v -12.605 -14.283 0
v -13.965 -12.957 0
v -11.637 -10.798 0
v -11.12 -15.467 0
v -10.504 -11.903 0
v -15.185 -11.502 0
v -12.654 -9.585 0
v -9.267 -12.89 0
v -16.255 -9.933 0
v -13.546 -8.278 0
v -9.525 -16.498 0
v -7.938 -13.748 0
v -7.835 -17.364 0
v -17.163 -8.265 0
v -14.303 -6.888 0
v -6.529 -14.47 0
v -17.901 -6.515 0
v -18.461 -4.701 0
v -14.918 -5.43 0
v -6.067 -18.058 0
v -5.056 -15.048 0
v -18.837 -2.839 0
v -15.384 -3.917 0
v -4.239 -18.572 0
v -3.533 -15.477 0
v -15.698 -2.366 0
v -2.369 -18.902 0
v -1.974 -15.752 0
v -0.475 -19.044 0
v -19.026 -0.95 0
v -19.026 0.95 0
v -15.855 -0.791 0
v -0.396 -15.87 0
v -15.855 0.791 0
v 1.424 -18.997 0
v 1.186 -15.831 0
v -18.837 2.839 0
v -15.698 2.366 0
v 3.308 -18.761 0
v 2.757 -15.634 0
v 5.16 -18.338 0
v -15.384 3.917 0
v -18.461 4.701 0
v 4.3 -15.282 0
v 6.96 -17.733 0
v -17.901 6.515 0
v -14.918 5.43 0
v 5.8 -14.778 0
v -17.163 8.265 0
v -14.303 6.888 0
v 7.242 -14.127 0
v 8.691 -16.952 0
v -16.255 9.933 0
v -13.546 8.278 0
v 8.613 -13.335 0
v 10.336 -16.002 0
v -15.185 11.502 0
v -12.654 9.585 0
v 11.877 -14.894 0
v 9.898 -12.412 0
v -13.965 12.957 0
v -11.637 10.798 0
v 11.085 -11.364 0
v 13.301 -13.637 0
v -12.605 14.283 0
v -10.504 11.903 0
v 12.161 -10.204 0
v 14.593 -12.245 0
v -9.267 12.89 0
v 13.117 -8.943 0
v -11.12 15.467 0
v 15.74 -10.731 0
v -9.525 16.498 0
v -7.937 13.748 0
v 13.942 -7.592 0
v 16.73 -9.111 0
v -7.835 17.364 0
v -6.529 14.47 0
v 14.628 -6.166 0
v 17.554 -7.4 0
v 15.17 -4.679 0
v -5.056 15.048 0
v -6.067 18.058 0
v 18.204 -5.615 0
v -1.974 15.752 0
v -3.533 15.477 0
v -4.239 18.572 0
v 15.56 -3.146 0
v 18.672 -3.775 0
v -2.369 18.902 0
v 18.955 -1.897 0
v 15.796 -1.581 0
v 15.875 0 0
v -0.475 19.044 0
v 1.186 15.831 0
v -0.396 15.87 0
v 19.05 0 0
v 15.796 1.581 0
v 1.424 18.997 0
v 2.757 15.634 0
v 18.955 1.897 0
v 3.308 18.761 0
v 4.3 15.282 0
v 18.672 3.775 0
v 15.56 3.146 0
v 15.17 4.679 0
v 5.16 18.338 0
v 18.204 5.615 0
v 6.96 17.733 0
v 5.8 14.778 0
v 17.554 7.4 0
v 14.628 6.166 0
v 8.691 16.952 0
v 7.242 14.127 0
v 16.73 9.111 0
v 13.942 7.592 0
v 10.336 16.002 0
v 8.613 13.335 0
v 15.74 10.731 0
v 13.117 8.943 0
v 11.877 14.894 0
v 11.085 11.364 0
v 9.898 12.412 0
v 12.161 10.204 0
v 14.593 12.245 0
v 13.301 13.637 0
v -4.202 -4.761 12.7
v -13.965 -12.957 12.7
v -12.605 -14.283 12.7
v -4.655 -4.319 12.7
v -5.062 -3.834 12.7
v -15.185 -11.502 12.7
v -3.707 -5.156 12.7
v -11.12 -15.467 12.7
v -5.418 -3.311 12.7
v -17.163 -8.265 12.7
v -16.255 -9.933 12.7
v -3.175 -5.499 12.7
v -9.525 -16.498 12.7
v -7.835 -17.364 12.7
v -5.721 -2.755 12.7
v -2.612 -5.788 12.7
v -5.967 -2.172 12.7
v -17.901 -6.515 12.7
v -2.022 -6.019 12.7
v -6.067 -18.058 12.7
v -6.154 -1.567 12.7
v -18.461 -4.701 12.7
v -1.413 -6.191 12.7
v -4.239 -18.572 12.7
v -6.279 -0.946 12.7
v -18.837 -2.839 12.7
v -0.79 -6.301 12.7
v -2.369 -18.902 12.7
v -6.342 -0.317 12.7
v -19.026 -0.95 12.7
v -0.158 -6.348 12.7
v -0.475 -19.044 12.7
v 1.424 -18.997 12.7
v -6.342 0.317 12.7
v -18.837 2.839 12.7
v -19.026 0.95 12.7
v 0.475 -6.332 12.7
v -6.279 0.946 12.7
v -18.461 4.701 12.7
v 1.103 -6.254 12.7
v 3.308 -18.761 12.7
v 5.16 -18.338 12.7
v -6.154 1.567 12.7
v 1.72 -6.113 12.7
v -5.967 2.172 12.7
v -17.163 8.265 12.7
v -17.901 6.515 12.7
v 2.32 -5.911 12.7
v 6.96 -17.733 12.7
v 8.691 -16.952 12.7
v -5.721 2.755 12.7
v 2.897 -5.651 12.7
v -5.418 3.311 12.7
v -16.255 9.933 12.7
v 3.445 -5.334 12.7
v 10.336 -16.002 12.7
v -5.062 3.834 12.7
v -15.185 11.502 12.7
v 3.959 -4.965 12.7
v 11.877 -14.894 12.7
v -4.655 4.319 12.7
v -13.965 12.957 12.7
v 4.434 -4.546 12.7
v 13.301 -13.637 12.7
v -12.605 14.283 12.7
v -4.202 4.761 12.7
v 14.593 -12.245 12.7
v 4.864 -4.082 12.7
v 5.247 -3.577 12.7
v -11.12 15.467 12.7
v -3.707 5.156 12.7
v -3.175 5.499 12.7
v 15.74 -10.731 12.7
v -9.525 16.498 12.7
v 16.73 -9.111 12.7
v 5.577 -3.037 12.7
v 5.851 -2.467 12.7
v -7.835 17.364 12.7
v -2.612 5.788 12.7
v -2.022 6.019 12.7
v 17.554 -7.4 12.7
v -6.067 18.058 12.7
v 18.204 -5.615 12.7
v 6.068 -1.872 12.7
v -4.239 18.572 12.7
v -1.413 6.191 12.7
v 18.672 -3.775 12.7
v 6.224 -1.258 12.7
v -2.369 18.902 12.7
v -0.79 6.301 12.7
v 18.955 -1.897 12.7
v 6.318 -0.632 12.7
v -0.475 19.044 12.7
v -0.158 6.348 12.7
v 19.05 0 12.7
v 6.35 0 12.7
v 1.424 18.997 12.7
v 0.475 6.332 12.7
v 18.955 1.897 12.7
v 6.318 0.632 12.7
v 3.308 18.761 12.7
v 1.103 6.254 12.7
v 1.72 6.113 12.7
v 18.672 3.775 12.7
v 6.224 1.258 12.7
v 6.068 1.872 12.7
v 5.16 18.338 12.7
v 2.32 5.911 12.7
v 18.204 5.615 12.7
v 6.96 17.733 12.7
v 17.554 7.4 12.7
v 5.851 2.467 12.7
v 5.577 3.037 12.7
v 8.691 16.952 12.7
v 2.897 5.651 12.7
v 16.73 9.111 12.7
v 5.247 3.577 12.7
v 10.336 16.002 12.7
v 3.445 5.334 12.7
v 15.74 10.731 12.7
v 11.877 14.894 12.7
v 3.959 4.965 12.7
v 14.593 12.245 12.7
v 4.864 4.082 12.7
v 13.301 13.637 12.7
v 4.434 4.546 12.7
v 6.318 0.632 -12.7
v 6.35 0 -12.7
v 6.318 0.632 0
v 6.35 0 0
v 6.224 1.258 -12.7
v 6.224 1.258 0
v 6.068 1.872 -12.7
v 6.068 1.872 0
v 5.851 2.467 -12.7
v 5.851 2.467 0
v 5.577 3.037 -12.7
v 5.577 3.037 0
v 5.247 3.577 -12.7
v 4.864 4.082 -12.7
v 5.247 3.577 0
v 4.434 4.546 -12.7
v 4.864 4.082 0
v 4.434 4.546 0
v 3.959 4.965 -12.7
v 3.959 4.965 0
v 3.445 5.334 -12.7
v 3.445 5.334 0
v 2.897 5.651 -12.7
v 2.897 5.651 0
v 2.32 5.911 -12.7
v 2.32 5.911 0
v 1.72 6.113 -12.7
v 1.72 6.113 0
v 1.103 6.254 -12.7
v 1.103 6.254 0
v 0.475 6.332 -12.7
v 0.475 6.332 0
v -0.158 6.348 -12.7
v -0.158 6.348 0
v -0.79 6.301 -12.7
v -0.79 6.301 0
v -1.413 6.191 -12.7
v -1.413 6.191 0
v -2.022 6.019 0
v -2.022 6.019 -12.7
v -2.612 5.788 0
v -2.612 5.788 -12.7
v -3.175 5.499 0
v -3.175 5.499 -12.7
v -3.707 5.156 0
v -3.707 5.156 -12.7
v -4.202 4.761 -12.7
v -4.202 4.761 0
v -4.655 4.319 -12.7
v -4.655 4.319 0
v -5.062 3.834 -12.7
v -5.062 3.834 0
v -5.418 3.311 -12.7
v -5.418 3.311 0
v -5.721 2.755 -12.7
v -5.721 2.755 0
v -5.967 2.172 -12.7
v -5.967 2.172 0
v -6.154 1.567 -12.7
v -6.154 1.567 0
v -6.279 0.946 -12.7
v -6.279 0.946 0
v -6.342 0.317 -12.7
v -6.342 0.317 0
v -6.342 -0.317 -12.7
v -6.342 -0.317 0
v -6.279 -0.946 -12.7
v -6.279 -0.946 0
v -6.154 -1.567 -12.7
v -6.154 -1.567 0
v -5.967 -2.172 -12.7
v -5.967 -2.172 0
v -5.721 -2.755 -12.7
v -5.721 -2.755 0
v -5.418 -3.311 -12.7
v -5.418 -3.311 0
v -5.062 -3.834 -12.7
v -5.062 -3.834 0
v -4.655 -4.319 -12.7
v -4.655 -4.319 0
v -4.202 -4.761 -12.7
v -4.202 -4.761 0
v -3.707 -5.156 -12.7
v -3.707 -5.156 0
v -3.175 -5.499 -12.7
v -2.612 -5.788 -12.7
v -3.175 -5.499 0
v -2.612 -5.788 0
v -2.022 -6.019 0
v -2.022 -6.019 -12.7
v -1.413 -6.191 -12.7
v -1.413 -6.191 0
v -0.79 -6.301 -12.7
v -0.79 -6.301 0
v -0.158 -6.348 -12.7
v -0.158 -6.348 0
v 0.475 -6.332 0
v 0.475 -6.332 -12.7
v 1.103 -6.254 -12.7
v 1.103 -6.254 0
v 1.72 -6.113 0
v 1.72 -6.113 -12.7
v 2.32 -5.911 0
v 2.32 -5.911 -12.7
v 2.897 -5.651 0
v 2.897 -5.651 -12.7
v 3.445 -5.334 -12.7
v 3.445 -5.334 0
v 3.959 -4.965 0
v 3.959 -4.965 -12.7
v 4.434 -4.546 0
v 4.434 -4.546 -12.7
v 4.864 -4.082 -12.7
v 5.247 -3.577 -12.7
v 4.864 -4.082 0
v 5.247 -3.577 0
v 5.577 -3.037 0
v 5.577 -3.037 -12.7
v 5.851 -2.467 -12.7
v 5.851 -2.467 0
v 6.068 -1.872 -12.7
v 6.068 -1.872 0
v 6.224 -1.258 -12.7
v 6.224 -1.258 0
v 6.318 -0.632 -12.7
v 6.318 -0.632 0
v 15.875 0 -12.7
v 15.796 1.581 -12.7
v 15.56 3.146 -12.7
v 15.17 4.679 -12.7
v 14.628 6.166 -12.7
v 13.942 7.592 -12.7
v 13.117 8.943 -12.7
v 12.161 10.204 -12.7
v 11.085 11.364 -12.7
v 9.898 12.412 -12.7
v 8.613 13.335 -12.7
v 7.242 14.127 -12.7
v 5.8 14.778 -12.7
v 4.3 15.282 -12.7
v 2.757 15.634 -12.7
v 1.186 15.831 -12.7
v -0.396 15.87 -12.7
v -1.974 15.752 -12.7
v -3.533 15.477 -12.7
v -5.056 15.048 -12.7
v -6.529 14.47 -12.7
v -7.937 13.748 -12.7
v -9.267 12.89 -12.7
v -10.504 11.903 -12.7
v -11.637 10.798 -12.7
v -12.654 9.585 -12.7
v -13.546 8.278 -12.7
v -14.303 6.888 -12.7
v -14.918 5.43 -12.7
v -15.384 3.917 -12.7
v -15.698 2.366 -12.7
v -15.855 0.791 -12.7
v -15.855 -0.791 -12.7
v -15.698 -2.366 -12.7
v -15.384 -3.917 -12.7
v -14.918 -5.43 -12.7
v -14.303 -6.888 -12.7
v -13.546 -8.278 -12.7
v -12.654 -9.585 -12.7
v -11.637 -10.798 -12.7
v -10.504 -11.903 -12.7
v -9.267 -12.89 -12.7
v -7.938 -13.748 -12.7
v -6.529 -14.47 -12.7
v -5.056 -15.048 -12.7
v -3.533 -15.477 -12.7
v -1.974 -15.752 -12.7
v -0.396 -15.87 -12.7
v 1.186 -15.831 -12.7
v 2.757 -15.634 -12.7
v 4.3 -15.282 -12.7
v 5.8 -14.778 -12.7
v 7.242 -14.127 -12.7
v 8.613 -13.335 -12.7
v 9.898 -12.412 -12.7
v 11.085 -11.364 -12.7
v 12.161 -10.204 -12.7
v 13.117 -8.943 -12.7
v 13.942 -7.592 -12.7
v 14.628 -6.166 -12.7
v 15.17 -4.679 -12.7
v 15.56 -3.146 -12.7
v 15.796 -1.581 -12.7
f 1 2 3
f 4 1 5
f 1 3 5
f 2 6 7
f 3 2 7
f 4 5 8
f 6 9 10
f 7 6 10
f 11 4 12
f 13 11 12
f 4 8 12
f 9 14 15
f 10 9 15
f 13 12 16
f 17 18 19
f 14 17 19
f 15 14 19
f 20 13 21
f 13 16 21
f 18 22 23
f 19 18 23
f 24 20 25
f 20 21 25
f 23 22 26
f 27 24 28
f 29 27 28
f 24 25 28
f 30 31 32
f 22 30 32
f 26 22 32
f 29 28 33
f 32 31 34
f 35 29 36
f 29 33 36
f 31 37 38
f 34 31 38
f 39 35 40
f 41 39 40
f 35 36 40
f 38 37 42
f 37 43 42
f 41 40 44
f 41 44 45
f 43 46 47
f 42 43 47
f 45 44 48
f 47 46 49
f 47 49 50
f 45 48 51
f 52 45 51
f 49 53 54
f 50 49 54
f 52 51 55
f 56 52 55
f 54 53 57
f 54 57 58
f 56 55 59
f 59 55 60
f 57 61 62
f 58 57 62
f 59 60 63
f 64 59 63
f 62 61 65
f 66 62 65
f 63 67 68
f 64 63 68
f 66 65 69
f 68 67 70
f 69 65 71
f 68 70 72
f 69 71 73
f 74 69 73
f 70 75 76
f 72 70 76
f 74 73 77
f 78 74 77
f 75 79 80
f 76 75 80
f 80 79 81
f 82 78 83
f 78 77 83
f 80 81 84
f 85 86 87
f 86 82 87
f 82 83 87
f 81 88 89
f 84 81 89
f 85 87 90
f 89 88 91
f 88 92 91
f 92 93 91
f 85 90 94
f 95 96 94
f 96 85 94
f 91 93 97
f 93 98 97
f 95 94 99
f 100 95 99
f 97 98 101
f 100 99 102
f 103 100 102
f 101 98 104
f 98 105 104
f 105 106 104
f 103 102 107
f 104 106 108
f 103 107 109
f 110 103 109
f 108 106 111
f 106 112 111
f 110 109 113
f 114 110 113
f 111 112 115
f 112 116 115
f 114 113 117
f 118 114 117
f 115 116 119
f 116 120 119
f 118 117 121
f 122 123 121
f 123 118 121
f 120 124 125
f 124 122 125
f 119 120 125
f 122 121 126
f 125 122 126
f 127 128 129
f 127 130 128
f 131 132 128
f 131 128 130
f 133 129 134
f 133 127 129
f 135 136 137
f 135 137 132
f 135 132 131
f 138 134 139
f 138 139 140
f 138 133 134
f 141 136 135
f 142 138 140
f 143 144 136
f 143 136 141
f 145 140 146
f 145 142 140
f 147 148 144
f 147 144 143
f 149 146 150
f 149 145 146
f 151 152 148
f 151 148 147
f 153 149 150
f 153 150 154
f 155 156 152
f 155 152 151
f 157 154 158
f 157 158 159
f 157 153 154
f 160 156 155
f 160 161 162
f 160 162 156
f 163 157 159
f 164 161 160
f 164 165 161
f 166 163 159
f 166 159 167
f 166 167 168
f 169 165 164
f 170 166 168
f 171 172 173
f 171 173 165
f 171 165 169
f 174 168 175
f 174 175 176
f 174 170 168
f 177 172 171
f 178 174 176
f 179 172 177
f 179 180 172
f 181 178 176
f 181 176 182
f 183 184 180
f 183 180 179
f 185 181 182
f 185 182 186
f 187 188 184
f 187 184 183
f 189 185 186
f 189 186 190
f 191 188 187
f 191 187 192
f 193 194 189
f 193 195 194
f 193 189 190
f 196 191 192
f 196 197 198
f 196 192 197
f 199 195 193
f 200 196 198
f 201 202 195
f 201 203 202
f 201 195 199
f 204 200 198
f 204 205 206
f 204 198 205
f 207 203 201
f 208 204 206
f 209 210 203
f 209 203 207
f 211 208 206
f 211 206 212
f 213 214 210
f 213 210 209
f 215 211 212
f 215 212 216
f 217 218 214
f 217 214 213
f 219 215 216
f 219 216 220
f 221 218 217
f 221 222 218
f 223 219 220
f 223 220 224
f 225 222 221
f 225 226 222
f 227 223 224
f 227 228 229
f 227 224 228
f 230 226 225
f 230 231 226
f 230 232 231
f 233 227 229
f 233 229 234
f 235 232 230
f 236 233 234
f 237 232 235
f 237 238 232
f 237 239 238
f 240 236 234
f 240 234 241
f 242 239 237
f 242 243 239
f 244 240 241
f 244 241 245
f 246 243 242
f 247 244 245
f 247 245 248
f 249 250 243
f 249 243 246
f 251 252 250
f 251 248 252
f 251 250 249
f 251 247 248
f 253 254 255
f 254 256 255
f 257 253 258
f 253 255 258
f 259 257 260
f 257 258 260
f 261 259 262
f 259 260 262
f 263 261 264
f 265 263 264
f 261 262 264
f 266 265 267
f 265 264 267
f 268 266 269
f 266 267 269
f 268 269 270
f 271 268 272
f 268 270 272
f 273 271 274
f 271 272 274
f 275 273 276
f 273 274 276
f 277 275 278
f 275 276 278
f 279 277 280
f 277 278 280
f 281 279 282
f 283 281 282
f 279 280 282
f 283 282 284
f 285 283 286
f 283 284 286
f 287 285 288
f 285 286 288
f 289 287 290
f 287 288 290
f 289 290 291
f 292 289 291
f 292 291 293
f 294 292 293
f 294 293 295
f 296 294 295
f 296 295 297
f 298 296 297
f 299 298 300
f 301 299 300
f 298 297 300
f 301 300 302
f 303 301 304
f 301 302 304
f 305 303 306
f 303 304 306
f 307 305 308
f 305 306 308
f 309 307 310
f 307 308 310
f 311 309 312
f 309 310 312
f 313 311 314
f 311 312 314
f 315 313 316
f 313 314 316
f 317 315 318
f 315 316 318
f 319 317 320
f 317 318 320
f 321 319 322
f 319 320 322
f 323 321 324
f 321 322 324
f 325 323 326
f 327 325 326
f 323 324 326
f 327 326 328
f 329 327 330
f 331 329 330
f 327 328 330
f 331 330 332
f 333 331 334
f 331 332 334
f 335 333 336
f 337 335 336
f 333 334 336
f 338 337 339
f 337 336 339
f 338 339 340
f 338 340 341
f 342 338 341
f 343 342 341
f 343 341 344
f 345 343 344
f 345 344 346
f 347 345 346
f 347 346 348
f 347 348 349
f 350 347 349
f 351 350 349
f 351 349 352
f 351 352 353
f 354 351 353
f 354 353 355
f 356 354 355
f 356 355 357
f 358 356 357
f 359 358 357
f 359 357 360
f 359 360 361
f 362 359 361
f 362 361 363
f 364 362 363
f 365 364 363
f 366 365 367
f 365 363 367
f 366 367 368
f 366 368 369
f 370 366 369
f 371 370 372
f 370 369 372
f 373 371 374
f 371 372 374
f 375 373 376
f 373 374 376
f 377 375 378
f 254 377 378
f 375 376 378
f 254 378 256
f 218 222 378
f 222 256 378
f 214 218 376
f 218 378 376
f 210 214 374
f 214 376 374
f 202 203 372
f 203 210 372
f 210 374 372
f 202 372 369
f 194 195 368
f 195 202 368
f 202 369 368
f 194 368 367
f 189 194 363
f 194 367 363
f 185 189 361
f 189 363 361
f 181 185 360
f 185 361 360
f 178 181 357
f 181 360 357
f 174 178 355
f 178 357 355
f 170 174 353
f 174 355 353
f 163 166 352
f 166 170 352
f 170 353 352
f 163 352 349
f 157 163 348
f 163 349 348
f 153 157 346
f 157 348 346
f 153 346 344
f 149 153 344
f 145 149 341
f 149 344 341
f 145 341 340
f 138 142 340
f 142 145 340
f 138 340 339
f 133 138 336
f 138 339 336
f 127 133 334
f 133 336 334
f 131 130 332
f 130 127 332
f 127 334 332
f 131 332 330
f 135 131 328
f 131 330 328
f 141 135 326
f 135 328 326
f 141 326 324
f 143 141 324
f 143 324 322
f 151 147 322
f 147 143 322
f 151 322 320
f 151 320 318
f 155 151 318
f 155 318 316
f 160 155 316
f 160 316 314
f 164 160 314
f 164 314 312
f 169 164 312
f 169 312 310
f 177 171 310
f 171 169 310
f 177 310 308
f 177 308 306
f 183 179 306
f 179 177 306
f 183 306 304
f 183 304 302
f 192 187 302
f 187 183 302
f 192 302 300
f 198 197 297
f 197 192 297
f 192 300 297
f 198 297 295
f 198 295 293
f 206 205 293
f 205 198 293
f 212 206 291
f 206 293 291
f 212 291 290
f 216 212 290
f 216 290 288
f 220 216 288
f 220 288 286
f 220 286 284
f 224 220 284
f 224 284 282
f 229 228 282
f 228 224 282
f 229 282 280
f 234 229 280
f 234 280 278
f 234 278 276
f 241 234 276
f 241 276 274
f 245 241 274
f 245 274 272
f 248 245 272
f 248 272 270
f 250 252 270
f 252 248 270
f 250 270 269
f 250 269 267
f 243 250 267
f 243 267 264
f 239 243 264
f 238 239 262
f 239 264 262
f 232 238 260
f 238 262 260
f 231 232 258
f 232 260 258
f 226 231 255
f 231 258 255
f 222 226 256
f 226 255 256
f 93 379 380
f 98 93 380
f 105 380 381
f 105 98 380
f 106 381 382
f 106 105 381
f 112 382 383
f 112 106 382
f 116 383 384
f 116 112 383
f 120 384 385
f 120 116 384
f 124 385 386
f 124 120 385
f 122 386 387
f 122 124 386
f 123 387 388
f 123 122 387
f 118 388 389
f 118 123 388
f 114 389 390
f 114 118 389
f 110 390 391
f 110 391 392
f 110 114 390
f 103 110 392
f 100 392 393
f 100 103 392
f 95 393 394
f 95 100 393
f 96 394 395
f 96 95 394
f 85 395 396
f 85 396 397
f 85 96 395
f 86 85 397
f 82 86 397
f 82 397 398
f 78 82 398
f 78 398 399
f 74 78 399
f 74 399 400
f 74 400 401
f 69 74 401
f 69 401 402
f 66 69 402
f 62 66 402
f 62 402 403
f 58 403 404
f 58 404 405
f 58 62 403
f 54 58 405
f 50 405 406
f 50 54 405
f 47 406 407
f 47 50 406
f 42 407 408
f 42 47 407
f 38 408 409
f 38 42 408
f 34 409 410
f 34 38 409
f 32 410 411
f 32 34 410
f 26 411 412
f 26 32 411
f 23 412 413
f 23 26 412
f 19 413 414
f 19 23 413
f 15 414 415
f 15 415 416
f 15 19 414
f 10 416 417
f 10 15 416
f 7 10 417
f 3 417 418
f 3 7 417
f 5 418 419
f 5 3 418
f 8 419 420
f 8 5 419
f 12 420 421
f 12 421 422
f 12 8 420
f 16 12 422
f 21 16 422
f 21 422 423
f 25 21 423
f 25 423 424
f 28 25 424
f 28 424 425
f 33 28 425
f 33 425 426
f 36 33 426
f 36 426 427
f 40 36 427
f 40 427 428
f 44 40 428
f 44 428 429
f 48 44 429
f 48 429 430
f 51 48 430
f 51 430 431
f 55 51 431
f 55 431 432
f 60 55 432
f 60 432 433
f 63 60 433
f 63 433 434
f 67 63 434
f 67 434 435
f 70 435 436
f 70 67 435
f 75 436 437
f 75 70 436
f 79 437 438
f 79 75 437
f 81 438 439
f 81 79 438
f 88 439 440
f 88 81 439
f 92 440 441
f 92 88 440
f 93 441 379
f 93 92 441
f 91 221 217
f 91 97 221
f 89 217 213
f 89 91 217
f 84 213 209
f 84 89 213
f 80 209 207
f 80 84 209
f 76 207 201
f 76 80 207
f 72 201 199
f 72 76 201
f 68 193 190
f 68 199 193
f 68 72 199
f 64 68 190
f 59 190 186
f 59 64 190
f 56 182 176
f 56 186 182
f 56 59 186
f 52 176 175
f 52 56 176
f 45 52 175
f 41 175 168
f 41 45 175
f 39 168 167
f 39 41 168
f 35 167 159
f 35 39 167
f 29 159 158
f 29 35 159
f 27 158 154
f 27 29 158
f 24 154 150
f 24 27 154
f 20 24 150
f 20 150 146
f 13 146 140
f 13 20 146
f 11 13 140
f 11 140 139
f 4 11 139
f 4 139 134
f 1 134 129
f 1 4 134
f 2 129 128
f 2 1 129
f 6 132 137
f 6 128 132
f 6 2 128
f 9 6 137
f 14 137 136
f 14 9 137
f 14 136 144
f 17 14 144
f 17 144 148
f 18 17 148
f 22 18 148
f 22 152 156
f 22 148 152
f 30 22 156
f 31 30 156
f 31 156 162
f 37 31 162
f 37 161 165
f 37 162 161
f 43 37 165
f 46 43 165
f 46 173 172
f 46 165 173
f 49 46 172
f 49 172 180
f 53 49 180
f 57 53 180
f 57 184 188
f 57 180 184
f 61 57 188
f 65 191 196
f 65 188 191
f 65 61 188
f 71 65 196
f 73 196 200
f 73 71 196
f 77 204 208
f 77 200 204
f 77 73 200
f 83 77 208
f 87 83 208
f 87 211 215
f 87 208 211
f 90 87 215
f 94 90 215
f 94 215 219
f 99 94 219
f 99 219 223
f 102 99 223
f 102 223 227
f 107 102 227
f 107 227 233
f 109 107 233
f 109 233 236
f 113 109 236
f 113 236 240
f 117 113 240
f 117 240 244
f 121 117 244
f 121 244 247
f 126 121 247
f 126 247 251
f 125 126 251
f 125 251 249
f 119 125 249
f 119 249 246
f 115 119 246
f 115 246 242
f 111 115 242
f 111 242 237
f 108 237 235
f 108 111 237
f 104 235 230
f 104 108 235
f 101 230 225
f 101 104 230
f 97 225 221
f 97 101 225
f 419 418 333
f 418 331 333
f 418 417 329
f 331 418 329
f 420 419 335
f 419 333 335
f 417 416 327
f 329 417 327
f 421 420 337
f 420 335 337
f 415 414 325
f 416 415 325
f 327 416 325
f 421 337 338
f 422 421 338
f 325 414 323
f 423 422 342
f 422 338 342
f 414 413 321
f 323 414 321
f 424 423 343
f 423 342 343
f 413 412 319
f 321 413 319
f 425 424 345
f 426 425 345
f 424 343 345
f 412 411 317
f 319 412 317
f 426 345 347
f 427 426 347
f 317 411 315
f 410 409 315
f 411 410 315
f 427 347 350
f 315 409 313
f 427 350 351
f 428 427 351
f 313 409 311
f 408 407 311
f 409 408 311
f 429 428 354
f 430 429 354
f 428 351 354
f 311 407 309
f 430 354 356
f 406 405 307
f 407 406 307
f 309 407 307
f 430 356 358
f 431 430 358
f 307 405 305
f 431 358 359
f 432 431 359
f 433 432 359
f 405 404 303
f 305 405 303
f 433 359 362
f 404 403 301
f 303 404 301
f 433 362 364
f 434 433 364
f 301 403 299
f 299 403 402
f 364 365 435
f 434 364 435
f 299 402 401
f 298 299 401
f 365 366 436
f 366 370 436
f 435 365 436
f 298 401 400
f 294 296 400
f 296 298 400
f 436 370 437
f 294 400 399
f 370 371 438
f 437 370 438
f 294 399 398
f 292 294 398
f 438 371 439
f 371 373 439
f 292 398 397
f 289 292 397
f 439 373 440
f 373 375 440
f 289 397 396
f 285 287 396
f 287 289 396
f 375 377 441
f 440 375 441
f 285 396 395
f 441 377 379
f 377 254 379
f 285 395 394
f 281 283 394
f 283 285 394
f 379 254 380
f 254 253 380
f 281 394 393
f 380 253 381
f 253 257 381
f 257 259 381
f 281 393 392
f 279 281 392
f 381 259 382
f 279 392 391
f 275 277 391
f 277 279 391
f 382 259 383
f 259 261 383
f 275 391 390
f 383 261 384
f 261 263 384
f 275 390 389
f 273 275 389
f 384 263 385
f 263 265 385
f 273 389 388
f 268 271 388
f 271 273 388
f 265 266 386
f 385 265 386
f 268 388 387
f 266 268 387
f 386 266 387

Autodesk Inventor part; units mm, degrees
ref_plane "YZ Plane" through (0, 0, 0) normal (1, 0, 0) x (0, 1, 0)
ref_plane "XZ Plane" through (0, 0, 0) normal (0, 1, 0) x (-1, 0, 0)
ref_plane "XY Plane" through (0, 0, 0) normal (0, 0, 1) x (1, 0, 0)
sketch "Sketch1" plane through (0, 0, 0) normal (0, 0, 1) x (1, 0, 0)
  circle A0 centre (0, 0) radius 19.05
  circle A1 centre (0, 0) radius 15.875
  circle A2 centre (0, 0) radius 6.35
  dimension "d0" = 38.1
  dimension "d1" = 31.75
  dimension "d2" = 12.7
extrude "Extrusion1" add sketch "Sketch1" against normal blind 12.7 contours A1
extrude "Extrusion2" add sketch "Sketch1" along normal blind 12.7 contours A0 | A1
properties part number "smaller gear"
